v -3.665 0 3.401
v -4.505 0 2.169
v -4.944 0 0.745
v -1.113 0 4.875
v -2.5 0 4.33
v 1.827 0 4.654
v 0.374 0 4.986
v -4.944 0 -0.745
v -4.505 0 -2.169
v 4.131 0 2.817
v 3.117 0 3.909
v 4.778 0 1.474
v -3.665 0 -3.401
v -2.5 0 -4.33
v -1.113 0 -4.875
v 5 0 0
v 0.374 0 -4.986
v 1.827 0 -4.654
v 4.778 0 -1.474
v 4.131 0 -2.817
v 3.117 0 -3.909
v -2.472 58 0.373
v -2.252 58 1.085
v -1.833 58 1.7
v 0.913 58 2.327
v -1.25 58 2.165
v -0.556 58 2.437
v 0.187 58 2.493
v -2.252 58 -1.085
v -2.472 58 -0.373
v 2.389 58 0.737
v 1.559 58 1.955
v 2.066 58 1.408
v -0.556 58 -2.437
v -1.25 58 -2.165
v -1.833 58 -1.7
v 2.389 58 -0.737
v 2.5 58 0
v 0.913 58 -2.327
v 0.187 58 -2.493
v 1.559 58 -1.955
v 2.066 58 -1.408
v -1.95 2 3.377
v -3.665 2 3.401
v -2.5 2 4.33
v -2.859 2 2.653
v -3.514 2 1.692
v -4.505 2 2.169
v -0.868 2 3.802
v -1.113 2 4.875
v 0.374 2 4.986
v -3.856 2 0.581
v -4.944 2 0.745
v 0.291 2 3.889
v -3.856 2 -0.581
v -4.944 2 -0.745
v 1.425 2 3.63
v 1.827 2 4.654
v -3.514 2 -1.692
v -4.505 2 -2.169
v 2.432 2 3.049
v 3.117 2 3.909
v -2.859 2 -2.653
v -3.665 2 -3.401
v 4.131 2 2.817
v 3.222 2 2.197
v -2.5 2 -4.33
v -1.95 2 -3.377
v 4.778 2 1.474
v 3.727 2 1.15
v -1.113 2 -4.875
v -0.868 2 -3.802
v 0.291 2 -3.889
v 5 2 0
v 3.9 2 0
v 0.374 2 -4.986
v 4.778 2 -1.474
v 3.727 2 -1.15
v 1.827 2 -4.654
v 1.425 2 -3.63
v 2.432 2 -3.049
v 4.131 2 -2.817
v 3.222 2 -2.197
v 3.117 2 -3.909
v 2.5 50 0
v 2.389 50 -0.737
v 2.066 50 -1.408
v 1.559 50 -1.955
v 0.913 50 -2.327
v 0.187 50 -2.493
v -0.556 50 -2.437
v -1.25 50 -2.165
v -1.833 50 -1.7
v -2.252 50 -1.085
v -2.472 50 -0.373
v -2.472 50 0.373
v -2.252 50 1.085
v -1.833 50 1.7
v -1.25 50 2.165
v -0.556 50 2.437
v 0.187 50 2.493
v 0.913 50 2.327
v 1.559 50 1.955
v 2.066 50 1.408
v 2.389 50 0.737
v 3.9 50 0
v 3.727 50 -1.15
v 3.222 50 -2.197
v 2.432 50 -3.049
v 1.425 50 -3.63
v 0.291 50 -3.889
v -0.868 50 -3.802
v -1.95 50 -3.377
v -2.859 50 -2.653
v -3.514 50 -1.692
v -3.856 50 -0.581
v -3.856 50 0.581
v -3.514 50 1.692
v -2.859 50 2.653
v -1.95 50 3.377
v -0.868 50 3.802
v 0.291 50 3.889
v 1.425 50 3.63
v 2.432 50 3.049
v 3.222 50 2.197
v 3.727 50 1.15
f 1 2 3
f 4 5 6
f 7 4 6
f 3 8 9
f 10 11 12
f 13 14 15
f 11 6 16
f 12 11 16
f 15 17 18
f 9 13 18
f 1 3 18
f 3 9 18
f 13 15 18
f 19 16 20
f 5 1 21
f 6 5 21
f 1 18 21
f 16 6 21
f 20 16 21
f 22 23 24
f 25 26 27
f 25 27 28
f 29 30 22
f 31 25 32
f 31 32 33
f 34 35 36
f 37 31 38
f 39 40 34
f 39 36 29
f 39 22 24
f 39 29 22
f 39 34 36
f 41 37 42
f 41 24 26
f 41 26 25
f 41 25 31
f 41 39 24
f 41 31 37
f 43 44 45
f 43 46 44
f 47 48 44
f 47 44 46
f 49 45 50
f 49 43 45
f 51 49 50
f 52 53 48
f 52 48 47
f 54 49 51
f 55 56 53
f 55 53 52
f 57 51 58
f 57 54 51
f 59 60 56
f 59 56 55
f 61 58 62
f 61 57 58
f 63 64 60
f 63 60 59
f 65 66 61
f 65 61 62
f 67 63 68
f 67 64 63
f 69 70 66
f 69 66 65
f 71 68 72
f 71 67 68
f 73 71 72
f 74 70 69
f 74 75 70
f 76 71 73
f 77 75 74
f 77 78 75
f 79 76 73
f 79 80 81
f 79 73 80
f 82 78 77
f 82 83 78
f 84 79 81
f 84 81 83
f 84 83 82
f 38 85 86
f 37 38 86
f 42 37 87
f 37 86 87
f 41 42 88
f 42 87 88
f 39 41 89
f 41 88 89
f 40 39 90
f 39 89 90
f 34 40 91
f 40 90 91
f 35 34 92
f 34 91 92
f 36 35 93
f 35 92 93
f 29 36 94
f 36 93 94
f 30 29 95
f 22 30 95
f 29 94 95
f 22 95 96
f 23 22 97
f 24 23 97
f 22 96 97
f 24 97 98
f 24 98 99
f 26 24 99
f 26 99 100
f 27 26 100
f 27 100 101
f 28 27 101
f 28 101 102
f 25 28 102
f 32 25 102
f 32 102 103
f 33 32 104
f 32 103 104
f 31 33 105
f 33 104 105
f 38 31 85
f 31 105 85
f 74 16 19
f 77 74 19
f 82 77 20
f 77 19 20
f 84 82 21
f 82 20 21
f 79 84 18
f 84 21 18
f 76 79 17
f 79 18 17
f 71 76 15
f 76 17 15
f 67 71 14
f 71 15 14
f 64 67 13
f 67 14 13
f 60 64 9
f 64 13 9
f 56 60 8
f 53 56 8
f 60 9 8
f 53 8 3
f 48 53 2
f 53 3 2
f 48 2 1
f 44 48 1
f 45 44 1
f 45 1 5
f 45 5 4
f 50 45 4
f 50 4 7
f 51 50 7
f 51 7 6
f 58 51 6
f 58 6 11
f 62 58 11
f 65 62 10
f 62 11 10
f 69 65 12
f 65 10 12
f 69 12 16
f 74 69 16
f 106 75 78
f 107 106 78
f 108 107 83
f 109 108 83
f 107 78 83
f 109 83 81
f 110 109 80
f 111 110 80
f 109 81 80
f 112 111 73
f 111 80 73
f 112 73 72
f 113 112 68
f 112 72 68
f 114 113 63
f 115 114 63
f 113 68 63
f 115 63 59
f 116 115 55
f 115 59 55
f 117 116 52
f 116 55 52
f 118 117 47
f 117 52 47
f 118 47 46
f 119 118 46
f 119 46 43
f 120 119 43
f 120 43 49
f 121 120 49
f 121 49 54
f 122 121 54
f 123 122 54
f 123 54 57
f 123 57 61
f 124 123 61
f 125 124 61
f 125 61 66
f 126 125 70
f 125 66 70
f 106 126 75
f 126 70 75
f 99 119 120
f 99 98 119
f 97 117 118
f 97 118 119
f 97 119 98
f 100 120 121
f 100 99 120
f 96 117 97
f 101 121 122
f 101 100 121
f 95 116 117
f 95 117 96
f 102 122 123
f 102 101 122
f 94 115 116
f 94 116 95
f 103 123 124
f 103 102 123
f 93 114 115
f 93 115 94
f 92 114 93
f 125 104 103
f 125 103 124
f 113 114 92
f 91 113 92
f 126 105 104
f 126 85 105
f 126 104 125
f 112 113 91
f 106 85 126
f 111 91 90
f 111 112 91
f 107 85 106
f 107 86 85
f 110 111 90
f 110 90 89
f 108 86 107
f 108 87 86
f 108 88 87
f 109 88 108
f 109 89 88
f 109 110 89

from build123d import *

# Parameters (mm, degrees)
SKETCH1_R           = 5
BOSS_EXTRUDE1_DEPTH = 2
SKETCH2_R           = 3.9
BOSS_EXTRUDE2_DEPTH = 48
SKETCH3_R           = 2.5
BOSS_EXTRUDE3_DEPTH = 8


with BuildPart() as part:
    # Sketch1 → Boss-Extrude1 (new body)
    with BuildSketch(Plane(origin=(0, 0, 0), x_dir=(1, 0, 0), z_dir=(0, 1, 0))):
        Circle(SKETCH1_R)
    extrude(amount=BOSS_EXTRUDE1_DEPTH)

    # Sketch2 → Boss-Extrude2 (add)
    with BuildSketch(Plane(origin=(0, 2, 0), x_dir=(1, 0, 0), z_dir=(0, 1, 0))):
        Circle(SKETCH2_R)
    extrude(amount=BOSS_EXTRUDE2_DEPTH)

    # Sketch3 → Boss-Extrude3 (add)
    with BuildSketch(Plane(origin=(0, 50, 0), x_dir=(1, 0, 0), z_dir=(0, 1, 0))):
        Circle(SKETCH3_R)
    extrude(amount=BOSS_EXTRUDE3_DEPTH)


solid = part.part
